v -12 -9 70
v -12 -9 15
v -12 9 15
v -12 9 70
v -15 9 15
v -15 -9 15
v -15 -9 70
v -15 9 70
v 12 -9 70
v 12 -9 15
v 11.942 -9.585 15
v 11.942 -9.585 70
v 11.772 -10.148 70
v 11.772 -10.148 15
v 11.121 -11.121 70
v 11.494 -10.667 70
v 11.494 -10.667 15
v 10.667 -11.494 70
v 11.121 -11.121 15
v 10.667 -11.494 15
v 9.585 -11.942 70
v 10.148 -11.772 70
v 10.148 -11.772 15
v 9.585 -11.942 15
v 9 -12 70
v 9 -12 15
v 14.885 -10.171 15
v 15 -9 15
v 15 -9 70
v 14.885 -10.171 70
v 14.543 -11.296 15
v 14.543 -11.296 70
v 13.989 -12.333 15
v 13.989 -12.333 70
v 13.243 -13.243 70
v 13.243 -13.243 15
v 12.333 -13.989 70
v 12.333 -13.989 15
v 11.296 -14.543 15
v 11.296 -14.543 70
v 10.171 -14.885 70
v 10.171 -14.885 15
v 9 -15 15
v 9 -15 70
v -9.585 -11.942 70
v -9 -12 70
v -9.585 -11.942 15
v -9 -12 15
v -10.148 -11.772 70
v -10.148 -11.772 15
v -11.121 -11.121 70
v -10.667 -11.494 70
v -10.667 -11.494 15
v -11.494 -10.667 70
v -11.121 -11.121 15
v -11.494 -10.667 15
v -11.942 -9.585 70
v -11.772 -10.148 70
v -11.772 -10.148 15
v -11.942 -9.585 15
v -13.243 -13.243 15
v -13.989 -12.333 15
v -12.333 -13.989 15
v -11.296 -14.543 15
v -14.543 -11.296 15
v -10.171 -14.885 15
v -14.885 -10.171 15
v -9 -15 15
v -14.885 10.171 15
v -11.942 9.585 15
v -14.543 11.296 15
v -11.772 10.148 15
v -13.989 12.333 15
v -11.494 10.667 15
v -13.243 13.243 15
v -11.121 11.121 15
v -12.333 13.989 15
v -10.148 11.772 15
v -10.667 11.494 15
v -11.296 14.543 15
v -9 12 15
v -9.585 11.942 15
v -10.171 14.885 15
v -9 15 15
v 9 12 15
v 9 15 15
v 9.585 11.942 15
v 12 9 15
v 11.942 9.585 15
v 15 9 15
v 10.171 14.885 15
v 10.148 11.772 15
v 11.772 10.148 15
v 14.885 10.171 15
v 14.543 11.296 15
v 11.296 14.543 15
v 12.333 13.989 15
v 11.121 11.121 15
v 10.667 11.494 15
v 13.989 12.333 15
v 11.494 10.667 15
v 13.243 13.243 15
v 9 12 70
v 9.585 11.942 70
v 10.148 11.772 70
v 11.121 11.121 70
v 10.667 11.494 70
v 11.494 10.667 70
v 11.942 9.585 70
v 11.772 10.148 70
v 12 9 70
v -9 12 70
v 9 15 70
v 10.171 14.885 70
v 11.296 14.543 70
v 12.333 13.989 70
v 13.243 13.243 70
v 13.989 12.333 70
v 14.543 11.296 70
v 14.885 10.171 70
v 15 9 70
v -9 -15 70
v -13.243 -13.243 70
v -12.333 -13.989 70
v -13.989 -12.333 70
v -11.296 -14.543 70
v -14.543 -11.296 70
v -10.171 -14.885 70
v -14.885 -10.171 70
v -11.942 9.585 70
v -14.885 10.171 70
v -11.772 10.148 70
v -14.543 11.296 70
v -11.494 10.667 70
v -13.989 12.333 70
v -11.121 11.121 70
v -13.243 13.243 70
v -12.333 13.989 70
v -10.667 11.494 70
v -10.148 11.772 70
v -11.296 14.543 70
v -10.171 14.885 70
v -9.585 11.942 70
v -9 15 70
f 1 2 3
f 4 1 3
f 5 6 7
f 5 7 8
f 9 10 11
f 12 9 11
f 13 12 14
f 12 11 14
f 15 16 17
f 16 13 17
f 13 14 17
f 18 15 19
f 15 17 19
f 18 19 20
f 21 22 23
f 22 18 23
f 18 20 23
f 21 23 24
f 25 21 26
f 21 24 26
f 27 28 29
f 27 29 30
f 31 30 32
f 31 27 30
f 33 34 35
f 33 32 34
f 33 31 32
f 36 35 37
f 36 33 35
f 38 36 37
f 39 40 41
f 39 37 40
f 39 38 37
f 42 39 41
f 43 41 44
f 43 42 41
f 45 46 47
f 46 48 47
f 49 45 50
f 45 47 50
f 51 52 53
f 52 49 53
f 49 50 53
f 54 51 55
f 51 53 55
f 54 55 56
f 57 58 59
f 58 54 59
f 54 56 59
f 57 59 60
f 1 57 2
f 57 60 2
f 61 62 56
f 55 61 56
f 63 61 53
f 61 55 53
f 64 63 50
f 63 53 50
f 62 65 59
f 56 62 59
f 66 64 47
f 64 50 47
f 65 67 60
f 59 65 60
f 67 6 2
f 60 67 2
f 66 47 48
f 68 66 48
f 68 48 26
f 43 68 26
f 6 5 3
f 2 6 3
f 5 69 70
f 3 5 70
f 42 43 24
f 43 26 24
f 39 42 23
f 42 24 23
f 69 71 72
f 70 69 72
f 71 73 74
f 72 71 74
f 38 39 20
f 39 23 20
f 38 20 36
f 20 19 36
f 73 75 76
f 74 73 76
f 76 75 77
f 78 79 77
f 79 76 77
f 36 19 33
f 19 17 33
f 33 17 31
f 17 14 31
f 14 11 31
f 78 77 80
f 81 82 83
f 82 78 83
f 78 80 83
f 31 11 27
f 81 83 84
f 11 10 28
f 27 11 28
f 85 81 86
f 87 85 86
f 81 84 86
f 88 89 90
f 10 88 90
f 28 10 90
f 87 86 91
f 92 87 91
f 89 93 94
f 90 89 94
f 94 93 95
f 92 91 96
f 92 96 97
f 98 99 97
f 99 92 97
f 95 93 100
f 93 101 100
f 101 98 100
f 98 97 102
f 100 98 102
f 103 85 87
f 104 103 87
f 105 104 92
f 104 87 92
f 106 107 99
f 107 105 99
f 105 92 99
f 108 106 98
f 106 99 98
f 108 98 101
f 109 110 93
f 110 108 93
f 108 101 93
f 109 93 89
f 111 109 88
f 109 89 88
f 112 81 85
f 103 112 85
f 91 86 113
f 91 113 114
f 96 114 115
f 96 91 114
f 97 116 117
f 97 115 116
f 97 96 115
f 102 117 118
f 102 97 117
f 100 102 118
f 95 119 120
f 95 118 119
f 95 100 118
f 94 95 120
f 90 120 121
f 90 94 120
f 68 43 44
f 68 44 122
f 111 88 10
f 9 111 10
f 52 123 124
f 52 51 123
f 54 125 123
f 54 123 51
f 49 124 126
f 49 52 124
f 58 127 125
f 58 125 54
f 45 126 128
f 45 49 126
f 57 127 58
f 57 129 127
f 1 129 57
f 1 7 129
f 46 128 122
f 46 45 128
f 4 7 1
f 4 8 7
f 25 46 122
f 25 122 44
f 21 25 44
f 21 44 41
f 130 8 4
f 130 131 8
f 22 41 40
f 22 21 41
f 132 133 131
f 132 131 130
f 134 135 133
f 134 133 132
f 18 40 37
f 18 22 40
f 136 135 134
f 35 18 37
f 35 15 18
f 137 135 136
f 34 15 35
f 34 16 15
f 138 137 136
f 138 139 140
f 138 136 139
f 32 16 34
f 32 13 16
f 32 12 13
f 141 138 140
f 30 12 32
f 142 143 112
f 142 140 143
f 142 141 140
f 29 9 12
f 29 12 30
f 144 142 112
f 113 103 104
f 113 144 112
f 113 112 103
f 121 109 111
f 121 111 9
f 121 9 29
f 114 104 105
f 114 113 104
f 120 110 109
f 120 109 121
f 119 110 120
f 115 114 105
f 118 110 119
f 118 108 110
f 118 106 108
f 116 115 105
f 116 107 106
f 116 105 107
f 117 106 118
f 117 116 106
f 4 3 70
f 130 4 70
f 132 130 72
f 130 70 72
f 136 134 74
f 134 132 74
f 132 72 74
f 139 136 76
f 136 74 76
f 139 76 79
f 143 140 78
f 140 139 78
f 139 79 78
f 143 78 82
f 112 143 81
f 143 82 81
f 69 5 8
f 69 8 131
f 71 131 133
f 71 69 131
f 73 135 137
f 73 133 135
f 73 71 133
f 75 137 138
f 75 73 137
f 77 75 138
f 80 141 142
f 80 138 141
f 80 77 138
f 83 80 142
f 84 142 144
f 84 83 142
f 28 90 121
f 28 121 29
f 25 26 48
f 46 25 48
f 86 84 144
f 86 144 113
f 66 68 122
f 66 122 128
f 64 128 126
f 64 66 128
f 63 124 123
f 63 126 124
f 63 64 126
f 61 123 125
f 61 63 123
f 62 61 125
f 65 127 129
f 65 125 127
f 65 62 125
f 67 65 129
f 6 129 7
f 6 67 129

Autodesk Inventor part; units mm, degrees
ref_plane "Start Plane" through (0, 0, 15) normal (0, 0, 1) x (1, 0, 0)
ref_plane "End Plane" through (0, 0, 70) normal (0, 0, 1) x (1, 0, 0)
sketch "Sketch" plane through (0, 0, 0) normal (0, 0, 1) x (1, 0, 0)
  line L0 (-15, -9) -> (-15, 9)
  line L1 (-9, 15) -> (9, 15)
  line L2 (15, 9) -> (15, -9)
  line L3 (9, -15) -> (-9, -15)
  arc A0 (-15, -9) -> (-9, -15) centre (-9, -9) ccw
  arc A1 (-9, 15) -> (-15, 9) centre (-9, 9) ccw
  arc A2 (15, 9) -> (9, 15) centre (9, 9) ccw
  arc A3 (9, -15) -> (15, -9) centre (9, -9) ccw
  arc A4 (-9, 12) -> (-12, 9) centre (-9, 9) ccw
  line L4 (-9, 12) -> (9, 12)
  arc A5 (12, 9) -> (9, 12) centre (9, 9) ccw
  line L5 (12, 9) -> (12, -9)
  arc A6 (9, -12) -> (12, -9) centre (9, -9) ccw
  line L6 (9, -12) -> (-9, -12)
  arc A7 (-12, -9) -> (-9, -12) centre (-9, -9) ccw
  line L7 (-12, -9) -> (-12, 9)
  line L8 (0, 22.7397) -> (0, -22.7397) construction
  line L9 (-22.7397, 0) -> (22.7397, 0) construction
  dimension "d7" = 6
  dimension "d10" = 30
  dimension "d11" = 30
  dimension "d12" = 3
  dimension "d15" = 15
  dimension "d16" = 15
extrude "Body" add sketch "Sketch" along normal up to surface (55 mm away) from surface at 15
sketch "Sketch3" plane through (0, 0, 0) normal (0, 0, 1) x (1, 0, 0)
  line L0 (0, 0) -> (10, 0)
ref_plane "Work Plane3" through (0, 0, 0) normal (0, -1, 0) x (1, 0, 0)
ref_plane "Work Plane4" through (-130, 9, 15) normal (0, 0, -1) x (-1, 0, 0)
split "Split1" plane through (-130, 9, 15) removes the side toward (0, 0, -1)
ref_plane "Work Plane5" through (0, 231, 70) normal (0, 0, 1) x (1, 0, 0)
split "Split2" plane through (0, 231, 70) removes the side toward (0, 0, 1)
sketch "Sketch4" plane through (0, 0, 0) normal (0, -1, 0) x (1, 0, 0)
  line L0 (-2, 15) -> (12, 15) projected
  line L1 (-2, 70) -> (12, 70) projected
  dimension "d18" = 55
equation "\"d7\" = G_IR"
equation "\"d10\" = G_H"
equation "\"d11\" = G_W"
equation "\"d12\" = G_T"
equation "\"d15\" = 0.5 * d10"
equation "\"d16\" = 0.5 * d11"
equation "\"d3\" = G_L"
equation "\"G_W\" = 30"
equation "\"G_H\" = 30"
equation "\"G_T\" = 3"
equation "\"G_IR\" = 6"
equation "\"G_L\" = d18"
equation "\"G_OFFSET_START\" = -15"
equation "\"G_OFFSET_END\" = -15"
equation "\"d13\" = -G_OFFSET_START"
equation "\"B_L\" = 85"
properties part number "DIN EN 10219-2 - 30 x 30 x 3  - 55" material "Steel, Mild"
